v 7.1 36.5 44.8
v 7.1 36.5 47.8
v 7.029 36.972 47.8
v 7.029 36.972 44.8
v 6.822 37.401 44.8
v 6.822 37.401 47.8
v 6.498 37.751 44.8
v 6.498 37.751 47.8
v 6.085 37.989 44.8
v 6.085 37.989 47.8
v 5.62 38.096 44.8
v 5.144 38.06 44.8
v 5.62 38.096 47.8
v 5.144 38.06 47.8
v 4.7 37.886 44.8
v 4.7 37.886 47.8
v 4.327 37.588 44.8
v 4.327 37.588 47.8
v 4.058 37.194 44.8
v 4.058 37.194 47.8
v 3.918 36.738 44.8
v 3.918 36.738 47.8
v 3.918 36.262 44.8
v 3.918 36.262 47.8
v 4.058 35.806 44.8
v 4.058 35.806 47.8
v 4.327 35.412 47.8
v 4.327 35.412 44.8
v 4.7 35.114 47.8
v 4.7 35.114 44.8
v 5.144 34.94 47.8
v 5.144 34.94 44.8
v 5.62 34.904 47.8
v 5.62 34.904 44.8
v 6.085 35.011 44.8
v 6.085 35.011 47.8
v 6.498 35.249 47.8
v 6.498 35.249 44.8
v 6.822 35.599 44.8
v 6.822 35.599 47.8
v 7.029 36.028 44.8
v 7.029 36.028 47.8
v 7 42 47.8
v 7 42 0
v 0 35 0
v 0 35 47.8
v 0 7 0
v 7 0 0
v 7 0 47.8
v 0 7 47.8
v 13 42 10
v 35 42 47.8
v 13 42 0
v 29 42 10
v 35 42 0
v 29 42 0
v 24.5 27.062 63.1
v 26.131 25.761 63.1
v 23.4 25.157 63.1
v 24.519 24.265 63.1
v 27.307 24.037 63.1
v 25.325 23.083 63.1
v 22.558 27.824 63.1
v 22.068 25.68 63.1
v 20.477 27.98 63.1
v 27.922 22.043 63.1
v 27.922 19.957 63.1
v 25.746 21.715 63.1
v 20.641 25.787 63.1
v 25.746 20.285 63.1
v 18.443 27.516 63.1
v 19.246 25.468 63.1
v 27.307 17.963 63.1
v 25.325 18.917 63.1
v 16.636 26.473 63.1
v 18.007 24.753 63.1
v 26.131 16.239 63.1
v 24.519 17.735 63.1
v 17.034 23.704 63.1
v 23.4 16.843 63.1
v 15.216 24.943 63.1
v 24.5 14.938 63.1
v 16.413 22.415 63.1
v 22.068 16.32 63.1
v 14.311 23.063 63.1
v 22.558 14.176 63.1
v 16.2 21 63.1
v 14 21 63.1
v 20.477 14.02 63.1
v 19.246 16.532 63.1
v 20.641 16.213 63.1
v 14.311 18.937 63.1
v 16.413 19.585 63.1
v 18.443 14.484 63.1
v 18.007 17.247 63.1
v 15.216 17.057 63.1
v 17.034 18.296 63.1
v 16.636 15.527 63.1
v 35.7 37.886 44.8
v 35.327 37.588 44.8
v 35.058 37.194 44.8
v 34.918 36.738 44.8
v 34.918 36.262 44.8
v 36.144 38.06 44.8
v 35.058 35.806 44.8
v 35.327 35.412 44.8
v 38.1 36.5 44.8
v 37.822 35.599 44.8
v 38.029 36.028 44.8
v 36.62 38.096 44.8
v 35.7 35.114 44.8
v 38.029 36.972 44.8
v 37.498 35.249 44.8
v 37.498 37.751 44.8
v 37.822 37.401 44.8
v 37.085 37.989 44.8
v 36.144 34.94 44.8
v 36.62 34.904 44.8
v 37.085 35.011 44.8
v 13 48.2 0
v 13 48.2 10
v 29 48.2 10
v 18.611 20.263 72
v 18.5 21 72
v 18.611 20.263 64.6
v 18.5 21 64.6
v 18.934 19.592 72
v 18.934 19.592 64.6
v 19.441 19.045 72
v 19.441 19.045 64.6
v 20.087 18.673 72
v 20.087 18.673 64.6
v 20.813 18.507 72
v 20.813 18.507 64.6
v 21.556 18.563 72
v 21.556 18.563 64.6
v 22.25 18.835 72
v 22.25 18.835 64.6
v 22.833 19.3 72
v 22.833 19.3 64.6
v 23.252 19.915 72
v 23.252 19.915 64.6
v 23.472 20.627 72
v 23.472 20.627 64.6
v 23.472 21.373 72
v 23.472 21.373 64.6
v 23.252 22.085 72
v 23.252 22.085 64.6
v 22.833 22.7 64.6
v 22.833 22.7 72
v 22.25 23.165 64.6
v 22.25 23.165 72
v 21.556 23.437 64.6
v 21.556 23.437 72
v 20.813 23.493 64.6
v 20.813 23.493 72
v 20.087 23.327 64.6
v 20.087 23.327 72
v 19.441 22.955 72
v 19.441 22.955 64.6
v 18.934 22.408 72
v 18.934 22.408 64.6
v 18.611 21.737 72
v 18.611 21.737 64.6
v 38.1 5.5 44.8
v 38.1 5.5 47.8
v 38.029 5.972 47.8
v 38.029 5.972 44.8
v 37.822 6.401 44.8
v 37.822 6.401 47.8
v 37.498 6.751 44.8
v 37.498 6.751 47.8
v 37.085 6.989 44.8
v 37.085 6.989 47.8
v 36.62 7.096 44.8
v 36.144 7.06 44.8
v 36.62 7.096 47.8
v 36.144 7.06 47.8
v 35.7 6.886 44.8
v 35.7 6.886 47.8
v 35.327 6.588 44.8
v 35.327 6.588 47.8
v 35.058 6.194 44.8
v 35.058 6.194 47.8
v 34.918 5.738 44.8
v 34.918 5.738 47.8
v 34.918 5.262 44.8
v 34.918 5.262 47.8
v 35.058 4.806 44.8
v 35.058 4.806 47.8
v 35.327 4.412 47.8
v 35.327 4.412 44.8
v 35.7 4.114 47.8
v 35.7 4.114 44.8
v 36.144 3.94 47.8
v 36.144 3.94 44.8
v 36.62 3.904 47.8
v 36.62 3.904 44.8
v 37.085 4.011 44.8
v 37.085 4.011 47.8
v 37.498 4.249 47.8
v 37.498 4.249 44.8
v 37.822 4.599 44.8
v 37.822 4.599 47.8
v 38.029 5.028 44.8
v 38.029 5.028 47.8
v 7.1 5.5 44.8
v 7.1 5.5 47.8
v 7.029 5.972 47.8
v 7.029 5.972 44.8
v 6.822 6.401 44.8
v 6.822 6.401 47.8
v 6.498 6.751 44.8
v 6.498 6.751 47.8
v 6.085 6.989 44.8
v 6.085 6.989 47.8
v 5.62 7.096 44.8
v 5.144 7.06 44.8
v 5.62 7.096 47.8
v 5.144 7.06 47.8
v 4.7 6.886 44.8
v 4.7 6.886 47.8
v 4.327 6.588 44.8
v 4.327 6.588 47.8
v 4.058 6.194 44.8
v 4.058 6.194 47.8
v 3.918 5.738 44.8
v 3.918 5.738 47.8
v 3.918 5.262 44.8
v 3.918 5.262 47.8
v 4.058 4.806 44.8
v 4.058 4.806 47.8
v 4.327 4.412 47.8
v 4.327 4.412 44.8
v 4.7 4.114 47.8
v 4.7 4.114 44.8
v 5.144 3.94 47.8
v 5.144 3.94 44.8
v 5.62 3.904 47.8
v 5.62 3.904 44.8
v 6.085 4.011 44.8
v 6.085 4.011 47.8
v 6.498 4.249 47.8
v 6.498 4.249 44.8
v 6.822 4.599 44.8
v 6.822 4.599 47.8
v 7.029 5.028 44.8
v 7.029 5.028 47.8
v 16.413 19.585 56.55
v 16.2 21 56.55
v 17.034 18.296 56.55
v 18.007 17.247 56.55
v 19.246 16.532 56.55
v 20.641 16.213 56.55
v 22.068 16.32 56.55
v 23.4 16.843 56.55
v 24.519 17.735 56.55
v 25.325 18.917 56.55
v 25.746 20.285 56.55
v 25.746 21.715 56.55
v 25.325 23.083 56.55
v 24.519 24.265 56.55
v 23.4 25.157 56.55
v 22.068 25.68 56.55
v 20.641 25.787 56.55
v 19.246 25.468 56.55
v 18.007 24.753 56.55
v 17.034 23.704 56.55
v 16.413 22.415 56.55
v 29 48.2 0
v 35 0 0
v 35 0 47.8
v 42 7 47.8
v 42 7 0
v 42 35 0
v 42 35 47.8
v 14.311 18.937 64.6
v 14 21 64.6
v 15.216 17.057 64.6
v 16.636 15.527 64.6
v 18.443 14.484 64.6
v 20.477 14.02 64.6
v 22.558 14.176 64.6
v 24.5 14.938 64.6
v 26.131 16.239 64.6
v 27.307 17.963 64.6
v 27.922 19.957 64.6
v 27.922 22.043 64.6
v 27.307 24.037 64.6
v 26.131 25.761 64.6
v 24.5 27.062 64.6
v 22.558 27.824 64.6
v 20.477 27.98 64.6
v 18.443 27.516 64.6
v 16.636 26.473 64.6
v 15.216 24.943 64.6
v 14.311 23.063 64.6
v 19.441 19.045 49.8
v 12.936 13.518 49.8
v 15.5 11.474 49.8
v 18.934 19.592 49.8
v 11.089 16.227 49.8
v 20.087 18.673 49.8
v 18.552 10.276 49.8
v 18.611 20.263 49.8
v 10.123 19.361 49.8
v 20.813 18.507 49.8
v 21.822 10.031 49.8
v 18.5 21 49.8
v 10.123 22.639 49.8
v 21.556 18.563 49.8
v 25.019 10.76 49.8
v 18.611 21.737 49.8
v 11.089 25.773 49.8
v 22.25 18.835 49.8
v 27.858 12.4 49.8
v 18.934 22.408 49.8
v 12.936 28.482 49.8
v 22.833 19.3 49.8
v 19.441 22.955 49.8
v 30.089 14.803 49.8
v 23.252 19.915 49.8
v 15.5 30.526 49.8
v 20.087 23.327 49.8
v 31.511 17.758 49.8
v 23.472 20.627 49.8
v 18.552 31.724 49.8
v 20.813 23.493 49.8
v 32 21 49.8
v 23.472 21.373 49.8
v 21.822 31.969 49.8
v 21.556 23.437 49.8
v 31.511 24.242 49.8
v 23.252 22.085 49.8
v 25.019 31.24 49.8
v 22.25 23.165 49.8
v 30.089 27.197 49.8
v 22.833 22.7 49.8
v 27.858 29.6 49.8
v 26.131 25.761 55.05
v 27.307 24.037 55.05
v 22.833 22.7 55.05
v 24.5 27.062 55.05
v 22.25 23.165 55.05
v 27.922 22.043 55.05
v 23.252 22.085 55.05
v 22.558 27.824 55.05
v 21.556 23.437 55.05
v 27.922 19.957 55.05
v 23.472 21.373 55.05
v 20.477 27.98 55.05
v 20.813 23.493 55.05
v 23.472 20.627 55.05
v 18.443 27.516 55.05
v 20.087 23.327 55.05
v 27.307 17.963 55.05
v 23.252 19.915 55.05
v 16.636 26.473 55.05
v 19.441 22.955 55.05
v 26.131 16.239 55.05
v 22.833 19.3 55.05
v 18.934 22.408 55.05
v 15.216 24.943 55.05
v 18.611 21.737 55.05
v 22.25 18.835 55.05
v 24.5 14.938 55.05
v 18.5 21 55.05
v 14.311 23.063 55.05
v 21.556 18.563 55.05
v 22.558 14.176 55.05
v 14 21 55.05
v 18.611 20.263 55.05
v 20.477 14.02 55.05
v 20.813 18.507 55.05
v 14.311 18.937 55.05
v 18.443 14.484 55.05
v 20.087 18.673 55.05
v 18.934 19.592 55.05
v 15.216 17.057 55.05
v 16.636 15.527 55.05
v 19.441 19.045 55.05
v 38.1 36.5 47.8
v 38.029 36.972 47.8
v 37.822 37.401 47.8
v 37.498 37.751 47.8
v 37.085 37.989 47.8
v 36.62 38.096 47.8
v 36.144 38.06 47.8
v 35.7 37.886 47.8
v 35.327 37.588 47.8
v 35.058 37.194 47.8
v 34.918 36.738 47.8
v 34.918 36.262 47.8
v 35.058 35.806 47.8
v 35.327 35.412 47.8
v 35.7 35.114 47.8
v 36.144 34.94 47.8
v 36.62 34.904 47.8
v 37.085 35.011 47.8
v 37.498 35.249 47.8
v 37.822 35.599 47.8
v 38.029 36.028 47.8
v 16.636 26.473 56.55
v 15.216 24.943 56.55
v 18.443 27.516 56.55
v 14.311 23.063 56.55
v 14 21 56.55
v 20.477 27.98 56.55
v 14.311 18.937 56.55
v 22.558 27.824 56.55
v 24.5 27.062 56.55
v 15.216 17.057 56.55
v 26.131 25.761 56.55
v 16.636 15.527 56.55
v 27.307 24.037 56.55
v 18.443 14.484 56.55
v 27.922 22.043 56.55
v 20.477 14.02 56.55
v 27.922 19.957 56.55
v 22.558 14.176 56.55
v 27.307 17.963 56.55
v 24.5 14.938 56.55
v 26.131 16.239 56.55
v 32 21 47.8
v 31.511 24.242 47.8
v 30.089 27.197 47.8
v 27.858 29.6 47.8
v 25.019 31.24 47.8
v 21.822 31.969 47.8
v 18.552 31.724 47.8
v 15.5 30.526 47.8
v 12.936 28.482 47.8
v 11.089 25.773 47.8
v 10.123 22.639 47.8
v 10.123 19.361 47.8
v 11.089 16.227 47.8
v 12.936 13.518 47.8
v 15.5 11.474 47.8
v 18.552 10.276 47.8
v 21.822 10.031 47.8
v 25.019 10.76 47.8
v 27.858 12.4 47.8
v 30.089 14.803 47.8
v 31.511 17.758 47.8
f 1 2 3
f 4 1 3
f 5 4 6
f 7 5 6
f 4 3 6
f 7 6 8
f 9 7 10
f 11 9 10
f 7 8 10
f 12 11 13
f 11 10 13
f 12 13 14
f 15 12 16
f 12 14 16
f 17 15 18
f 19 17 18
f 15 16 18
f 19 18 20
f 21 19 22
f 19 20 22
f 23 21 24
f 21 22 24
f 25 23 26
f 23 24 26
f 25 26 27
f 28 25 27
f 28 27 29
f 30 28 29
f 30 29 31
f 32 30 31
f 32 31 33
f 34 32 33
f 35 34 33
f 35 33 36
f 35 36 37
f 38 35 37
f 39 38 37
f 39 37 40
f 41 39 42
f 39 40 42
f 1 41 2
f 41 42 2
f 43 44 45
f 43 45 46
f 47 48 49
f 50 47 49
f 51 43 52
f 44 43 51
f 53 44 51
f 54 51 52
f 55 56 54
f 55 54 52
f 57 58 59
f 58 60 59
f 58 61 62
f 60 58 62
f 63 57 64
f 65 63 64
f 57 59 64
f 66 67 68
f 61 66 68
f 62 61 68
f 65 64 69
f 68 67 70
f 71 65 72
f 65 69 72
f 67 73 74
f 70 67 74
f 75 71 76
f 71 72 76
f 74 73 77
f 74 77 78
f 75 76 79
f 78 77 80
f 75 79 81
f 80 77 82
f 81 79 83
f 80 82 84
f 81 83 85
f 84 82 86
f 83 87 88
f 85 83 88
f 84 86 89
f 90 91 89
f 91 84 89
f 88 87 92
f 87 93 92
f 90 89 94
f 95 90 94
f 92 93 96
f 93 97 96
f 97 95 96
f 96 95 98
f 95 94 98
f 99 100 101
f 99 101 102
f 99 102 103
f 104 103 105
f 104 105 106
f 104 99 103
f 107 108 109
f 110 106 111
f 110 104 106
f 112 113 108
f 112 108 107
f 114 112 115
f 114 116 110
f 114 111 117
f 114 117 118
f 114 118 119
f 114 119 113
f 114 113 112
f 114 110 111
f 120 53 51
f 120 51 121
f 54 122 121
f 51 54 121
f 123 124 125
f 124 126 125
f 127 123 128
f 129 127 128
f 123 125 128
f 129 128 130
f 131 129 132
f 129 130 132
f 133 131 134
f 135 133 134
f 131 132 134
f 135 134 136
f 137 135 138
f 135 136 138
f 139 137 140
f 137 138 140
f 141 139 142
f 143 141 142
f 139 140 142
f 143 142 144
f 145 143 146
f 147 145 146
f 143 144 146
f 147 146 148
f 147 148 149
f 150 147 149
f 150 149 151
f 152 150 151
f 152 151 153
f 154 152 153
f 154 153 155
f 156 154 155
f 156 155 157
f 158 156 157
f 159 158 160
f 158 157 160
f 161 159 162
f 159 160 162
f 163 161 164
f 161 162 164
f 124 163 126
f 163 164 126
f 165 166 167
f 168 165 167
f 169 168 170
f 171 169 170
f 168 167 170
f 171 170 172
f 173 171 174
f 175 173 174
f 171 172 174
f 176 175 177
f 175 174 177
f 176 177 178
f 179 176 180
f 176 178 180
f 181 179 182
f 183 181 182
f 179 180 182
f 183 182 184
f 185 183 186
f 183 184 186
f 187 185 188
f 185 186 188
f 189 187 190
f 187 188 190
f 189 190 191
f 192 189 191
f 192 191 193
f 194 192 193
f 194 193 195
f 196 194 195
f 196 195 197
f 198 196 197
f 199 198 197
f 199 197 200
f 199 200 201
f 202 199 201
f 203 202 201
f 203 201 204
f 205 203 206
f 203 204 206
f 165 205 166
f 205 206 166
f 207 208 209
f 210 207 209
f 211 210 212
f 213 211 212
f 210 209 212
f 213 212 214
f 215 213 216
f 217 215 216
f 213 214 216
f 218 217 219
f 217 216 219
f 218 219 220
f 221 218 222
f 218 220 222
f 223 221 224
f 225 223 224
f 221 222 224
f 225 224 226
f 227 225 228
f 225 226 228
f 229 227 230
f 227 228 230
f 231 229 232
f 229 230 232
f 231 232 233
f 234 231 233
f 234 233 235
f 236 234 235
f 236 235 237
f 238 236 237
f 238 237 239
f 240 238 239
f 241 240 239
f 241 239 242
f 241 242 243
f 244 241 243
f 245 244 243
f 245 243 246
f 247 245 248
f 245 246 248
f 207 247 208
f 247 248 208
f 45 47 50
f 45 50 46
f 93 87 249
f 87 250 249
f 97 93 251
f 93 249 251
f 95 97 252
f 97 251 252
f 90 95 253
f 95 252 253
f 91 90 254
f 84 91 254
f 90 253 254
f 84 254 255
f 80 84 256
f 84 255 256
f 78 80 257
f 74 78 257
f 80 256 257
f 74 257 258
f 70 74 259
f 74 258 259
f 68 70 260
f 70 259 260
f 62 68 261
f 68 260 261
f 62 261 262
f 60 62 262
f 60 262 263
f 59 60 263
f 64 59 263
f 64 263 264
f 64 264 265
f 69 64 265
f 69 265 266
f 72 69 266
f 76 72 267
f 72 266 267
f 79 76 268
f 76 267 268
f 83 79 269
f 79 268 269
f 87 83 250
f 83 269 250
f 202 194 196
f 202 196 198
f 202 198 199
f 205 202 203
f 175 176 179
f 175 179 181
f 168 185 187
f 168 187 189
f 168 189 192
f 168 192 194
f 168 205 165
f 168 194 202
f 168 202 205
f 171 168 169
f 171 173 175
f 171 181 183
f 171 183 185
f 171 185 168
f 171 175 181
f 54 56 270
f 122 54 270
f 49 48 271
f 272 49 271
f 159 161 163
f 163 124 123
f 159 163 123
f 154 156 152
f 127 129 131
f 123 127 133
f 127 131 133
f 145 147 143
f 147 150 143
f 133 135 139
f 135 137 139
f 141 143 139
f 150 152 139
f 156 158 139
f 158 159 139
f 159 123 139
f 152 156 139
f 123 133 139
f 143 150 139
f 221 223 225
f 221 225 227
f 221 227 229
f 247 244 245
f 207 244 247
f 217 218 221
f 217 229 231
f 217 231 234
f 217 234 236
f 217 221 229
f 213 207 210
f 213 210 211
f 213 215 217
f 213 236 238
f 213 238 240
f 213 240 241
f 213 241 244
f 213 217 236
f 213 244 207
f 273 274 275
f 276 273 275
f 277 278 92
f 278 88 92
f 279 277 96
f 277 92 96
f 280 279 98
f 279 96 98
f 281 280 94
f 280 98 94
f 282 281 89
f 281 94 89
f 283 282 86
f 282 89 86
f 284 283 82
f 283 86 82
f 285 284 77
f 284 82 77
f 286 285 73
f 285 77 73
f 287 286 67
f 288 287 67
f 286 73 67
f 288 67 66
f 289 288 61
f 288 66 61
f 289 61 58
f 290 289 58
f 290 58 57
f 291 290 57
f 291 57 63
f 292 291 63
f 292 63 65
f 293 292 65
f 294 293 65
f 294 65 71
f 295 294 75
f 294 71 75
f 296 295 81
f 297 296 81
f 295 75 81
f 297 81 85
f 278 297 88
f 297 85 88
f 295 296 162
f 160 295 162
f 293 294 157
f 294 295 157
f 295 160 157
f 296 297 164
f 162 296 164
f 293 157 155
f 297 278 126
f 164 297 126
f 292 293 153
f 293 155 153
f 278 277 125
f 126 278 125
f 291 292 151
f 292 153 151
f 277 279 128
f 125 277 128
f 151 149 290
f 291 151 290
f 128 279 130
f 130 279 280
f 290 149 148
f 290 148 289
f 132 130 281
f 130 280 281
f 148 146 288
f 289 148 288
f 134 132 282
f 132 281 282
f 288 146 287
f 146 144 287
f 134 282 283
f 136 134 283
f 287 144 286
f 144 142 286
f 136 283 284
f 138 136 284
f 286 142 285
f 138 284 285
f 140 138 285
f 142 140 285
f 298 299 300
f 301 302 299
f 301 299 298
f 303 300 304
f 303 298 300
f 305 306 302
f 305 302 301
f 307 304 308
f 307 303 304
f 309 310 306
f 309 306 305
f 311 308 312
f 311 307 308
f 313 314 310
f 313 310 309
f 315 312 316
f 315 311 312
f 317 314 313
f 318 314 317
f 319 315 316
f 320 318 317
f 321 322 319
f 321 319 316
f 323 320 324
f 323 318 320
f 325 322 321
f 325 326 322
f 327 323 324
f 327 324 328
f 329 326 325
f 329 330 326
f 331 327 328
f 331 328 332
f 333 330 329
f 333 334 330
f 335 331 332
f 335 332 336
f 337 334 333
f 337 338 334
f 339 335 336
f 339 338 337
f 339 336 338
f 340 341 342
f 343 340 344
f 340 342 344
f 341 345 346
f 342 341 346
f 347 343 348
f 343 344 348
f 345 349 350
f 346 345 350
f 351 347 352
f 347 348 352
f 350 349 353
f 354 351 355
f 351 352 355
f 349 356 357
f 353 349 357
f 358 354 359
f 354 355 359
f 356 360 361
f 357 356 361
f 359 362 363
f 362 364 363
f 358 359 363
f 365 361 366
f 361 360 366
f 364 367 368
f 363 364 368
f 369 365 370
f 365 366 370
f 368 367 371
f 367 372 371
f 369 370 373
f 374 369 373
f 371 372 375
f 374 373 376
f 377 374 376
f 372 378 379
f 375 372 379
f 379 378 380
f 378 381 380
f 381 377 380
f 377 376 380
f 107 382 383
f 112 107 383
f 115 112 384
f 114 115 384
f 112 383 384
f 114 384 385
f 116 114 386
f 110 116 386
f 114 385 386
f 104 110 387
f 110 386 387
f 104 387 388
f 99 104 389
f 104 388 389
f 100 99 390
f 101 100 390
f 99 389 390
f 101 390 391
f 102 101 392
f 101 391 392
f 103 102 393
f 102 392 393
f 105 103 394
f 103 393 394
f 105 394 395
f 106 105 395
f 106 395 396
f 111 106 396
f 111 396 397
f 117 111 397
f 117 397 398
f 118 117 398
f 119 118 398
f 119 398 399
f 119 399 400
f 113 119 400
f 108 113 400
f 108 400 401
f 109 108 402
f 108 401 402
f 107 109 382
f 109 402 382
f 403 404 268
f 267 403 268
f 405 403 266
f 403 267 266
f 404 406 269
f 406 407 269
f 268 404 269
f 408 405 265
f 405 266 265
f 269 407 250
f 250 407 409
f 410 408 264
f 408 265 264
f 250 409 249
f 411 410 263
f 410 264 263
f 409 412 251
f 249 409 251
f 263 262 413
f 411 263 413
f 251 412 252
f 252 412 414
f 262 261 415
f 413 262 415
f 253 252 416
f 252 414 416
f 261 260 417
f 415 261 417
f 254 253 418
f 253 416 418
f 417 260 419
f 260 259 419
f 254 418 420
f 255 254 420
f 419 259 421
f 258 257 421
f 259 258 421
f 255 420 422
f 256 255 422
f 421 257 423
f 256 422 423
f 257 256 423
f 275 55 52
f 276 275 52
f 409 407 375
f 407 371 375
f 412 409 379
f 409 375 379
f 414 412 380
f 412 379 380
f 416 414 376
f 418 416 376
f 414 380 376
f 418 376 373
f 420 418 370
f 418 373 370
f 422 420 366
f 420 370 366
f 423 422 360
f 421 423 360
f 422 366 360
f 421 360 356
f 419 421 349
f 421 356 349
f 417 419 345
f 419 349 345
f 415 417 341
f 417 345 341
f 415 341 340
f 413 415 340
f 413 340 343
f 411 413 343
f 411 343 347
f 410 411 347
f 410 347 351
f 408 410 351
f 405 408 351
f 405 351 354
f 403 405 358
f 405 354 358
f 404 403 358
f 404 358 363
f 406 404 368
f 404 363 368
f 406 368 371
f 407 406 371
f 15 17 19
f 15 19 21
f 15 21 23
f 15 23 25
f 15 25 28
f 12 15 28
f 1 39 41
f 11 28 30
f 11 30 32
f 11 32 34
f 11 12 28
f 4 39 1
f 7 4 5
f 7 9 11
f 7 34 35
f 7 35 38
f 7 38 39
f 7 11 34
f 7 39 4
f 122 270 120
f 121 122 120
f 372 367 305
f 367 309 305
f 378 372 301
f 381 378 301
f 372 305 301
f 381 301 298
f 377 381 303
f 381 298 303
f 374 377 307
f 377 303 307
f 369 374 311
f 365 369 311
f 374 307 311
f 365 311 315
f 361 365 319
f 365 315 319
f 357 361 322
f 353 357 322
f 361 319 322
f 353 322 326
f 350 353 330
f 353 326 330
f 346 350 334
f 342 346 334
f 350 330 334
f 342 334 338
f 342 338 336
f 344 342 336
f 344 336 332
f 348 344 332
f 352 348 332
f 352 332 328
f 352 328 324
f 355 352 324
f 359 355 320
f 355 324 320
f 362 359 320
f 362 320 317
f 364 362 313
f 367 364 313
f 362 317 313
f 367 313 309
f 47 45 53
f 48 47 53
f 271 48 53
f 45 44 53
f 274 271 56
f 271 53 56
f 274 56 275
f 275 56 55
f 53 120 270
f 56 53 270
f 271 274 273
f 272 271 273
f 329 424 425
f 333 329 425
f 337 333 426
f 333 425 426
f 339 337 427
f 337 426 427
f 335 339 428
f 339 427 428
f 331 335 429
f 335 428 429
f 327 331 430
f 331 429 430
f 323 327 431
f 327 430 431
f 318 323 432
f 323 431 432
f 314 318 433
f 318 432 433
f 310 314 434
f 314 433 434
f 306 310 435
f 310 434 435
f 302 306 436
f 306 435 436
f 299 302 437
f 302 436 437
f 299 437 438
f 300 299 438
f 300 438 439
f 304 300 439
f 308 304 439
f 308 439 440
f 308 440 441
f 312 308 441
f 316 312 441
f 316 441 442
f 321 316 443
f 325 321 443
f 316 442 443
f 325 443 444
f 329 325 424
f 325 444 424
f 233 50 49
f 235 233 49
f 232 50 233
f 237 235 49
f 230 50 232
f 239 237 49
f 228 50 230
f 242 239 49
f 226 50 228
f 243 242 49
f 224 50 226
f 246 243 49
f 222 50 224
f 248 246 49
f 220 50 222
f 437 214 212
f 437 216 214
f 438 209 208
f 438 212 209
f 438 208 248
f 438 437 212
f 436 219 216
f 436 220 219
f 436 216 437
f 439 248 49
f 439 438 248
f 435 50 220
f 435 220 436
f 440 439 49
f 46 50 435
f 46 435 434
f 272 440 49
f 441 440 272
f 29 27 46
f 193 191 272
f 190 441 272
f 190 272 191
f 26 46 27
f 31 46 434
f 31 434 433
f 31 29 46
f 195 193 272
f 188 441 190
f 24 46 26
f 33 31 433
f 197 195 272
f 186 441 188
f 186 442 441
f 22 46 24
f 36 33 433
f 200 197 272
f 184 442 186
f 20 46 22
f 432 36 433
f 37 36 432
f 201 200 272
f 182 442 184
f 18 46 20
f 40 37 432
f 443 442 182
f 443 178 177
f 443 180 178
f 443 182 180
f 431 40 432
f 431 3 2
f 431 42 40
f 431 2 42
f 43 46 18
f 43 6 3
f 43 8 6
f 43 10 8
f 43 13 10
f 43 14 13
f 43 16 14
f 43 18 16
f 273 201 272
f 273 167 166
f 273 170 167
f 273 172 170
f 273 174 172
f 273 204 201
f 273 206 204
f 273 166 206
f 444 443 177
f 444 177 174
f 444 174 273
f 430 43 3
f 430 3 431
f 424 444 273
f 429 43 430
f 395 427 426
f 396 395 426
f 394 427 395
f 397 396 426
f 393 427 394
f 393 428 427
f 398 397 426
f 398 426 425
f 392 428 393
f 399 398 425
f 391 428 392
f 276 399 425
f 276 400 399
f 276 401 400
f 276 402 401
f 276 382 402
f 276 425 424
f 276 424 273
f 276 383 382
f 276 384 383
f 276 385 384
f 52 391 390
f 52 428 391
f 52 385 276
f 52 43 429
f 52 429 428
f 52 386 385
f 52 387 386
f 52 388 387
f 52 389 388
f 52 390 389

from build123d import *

# Parameters (mm, degrees)
SKETCH1_W           = 42
SKETCH1_H           = 42
BOSS_EXTRUDE1_DEPTH = 47.8
CHAMFER1_SIZE       = 7
SKETCH2_W           = 16
SKETCH2_H           = 6.2
BOSS_EXTRUDE2_DEPTH = 10
SKETCH3_R           = 11
BOSS_EXTRUDE3_DEPTH = 2
SKETCH4_R           = 1.6
CUT_EXTRUDE1_DEPTH  = 3


with BuildPart() as part:
    # Sketch1 → Boss-Extrude1 (new body)
    with BuildSketch(Plane.XY):
        with Locations((21, 21)):
            Rectangle(SKETCH1_W, SKETCH1_H)
    extrude(amount=BOSS_EXTRUDE1_DEPTH)

    # Chamfer1
    chamfer1_edges = [part.edges().sort_by_distance(p)[0] for p in [
        (0, 42, 23.9),
        (42, 42, 23.9),
        (42, 0, 23.9),
        (0, 0, 23.9),
    ]]
    chamfer(chamfer1_edges, length=CHAMFER1_SIZE)

    # Sketch2 → Boss-Extrude2 (add)
    with BuildSketch(Plane(origin=(0, 0, 0), x_dir=(-1, 0, 0), z_dir=(0, 0, -1))):
        with Locations((-21, 45.1)):
            Rectangle(SKETCH2_W, SKETCH2_H)
    extrude(amount=-BOSS_EXTRUDE2_DEPTH)

    # Sketch3 → Boss-Extrude3 (add)
    with BuildSketch(Plane.XY.offset(47.8)):
        with Locations((21, 21)):
            Circle(SKETCH3_R)
    extrude(amount=BOSS_EXTRUDE3_DEPTH)

    # Sketch4 → Cut-Extrude1 (cut)
    with BuildSketch(Plane.XY.offset(47.8)):
        with Locations((5.5, 36.5)):
            Circle(SKETCH4_R)
        with Locations((36.5, 36.5)):
            Circle(SKETCH4_R)
        with Locations((36.5, 5.5)):
            Circle(SKETCH4_R)
        with Locations((5.5, 5.5)):
            Circle(SKETCH4_R)
    extrude(amount=-CUT_EXTRUDE1_DEPTH, mode=Mode.SUBTRACT)

    # Sketch5 → Revolve1 (revolve)
    with BuildSketch(Plane(origin=(0, 21, 0), x_dir=(1, 0, 0), z_dir=(0, 1, 0)), mode=Mode.PRIVATE) as revolve1_sk:
        Polygon((23.5, -49.8), (21, -49.8), (21, -72), (23.5, -72), (23.5, -64.6), (28, -64.6), (28, -63.1), (25.8, -63.1), (25.8, -56.55), (28, -56.55), (28, -55.05), (23.5, -55.05), align=None)
    revolve(revolve1_sk.sketch.rotate(Axis((21, 21, 49.8), (0, 0, 1)), 180), axis=Axis((21, 21, 49.8), (0, 0, 1)))


solid = part.part
